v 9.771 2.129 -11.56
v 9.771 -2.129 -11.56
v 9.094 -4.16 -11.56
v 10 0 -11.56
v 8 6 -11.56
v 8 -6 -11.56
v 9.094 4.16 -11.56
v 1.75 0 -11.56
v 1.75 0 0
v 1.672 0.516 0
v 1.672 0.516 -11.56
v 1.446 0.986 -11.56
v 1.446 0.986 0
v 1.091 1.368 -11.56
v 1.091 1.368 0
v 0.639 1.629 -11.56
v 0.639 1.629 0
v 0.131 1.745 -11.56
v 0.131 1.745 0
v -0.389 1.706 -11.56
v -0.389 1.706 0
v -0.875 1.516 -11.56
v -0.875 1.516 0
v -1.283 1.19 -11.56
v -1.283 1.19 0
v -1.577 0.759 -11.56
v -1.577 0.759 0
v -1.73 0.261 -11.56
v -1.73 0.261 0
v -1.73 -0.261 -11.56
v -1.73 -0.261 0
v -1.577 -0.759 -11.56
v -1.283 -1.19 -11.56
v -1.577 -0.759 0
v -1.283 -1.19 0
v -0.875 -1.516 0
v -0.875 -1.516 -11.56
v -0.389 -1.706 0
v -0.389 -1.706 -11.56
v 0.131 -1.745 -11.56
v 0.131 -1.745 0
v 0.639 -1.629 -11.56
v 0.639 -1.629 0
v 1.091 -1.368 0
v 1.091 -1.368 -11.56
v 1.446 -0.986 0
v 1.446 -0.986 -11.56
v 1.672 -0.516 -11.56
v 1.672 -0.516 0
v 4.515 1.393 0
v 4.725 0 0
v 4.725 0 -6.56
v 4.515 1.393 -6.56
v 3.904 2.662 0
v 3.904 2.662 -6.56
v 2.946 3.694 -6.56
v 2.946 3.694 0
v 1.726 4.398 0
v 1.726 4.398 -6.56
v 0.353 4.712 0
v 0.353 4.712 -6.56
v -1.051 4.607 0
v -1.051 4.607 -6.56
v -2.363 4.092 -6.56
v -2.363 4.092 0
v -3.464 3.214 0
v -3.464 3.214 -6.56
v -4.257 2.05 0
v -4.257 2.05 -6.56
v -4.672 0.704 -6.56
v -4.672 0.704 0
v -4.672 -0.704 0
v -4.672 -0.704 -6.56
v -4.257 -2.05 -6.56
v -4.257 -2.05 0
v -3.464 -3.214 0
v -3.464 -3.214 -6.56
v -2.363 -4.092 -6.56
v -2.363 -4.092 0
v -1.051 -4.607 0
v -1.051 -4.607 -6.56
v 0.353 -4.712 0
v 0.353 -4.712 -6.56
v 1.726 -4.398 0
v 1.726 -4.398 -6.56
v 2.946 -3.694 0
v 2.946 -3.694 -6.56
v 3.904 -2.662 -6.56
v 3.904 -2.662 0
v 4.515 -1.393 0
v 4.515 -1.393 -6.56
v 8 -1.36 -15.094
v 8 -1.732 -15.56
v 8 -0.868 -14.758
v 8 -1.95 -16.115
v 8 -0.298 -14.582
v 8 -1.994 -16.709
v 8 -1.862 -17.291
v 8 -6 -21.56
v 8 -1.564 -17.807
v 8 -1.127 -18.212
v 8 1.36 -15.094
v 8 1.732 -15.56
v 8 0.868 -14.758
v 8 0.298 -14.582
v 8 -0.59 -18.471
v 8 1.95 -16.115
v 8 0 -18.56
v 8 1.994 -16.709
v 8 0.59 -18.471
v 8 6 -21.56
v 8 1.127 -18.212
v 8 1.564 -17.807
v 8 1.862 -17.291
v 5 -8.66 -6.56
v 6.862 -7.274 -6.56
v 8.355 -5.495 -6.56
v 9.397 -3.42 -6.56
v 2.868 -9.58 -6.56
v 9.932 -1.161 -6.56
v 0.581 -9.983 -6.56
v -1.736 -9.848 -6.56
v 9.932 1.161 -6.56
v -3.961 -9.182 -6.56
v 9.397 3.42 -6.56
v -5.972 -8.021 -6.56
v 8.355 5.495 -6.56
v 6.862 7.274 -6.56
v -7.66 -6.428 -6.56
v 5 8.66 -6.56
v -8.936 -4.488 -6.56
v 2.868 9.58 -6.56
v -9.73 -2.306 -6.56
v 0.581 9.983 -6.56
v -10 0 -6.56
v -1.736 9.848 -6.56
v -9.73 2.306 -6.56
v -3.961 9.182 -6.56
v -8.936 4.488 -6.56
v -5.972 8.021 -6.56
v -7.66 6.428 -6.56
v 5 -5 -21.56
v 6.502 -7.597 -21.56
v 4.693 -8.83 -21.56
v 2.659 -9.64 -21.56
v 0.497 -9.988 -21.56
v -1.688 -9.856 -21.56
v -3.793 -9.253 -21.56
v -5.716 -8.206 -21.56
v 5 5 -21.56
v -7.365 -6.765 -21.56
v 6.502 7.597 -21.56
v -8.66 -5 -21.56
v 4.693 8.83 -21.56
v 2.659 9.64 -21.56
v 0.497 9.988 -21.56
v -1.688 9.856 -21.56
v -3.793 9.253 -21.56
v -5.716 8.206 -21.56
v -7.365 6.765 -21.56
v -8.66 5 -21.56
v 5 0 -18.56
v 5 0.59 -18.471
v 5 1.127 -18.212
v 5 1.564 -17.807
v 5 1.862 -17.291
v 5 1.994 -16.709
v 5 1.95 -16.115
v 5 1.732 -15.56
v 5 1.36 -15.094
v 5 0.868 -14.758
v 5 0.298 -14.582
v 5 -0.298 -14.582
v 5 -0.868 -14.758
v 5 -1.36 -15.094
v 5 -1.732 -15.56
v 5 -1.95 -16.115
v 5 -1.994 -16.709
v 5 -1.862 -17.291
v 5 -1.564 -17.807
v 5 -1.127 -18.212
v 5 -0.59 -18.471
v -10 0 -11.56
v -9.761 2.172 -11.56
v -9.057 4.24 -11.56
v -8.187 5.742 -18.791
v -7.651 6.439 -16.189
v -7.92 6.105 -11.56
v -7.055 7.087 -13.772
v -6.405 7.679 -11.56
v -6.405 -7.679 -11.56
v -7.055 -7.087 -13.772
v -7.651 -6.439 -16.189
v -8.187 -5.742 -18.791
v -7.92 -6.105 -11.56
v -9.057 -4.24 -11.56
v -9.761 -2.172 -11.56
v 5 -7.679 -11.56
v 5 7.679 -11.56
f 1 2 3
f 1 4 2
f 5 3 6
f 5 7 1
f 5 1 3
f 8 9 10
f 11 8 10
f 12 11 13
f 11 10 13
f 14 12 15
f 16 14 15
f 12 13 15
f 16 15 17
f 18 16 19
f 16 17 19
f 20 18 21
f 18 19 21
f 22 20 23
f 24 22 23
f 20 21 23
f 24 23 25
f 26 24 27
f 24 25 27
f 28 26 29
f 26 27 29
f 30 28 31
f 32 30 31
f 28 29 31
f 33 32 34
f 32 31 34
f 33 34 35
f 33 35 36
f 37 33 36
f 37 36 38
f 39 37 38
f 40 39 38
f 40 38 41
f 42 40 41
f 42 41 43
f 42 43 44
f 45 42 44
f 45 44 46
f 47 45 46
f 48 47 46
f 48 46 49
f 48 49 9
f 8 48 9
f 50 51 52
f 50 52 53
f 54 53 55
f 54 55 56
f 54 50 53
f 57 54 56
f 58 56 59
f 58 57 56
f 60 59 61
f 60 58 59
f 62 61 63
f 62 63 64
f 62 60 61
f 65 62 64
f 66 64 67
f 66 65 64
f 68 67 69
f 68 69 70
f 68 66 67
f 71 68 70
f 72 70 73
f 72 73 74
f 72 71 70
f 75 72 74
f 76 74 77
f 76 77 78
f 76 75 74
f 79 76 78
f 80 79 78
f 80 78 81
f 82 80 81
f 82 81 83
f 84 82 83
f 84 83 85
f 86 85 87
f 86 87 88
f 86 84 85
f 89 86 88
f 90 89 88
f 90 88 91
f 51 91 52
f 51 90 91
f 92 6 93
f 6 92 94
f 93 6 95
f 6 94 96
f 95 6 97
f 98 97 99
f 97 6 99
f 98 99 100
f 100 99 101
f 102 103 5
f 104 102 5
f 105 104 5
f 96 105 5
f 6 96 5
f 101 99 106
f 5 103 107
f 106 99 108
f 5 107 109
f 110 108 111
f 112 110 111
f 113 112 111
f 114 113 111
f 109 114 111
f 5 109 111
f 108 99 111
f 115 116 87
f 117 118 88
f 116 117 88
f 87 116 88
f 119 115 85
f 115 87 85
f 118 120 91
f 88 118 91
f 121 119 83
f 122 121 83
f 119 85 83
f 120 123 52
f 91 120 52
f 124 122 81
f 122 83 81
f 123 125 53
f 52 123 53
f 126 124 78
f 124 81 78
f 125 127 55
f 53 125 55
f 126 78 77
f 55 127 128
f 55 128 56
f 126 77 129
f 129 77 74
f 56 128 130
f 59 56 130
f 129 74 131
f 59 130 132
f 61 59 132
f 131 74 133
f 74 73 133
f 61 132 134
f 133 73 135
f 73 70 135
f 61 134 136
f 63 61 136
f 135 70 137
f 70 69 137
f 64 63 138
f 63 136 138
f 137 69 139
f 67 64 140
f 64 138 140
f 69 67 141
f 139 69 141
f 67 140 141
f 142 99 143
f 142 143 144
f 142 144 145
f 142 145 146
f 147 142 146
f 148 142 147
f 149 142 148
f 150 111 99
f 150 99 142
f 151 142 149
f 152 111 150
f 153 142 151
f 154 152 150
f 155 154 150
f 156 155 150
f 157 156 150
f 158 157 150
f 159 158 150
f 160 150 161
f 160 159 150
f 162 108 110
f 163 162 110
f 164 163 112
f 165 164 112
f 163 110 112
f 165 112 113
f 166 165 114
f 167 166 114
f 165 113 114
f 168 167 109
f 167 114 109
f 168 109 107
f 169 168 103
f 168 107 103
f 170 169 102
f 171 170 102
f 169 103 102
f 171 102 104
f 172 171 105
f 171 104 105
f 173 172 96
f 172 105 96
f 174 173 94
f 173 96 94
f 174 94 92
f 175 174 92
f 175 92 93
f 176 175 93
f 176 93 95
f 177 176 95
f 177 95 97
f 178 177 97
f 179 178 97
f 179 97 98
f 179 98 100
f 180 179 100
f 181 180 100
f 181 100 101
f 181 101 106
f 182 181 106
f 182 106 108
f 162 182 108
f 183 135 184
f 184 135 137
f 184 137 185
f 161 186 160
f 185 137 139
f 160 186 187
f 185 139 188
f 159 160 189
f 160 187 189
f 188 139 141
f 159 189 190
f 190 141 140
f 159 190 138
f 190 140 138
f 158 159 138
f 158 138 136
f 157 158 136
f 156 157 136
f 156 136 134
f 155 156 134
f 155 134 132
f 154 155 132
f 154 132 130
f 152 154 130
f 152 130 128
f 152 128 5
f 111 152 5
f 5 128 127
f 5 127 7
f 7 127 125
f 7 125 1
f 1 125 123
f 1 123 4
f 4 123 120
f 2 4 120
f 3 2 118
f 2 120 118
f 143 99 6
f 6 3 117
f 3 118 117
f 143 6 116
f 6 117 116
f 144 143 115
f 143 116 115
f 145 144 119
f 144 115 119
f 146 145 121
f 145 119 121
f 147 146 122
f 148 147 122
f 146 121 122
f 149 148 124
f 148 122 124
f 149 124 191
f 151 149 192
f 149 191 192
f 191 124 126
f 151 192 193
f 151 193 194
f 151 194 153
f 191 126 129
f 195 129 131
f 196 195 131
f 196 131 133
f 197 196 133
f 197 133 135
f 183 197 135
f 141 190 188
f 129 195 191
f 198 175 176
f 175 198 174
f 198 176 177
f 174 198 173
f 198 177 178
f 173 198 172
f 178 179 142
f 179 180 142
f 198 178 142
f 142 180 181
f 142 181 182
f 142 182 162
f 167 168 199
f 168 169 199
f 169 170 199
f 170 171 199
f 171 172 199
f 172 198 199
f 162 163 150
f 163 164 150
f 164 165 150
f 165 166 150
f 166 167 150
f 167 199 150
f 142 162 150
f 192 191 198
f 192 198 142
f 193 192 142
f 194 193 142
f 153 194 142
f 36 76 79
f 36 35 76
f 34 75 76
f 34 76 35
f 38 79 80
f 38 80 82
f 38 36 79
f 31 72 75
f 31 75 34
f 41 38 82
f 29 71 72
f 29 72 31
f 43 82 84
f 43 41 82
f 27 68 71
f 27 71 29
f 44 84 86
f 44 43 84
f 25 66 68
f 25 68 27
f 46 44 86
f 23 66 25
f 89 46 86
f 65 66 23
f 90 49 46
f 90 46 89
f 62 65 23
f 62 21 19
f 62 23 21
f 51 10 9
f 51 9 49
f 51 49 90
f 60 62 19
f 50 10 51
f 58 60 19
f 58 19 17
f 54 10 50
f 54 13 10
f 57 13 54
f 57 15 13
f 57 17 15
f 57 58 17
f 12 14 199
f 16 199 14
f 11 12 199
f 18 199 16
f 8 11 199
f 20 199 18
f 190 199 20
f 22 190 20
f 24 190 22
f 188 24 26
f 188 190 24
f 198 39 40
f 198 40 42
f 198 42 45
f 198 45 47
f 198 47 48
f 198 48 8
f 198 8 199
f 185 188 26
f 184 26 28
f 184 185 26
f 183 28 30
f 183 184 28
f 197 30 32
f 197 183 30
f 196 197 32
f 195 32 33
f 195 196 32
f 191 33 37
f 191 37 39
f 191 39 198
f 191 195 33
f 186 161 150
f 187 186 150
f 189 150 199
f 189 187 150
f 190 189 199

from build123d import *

# Parameters (mm, degrees)
SKETCH1_R               = 4.725
BOSS_EXTRUDE1_DEPTH     = 6.56
SKETCH5_R               = 10
BOSS_EXTRUDE3_DEPTH     = 15
CUT_EXTRUDE1_DEPTH      = 5
CUT_EXTRUDE1_DEPTH_BACK = 15
SKETCH4_W               = 2
SKETCH4_H               = 12
CUT_EXTRUDE2_DEPTH      = 10
CUT_EXTRUDE3_REACH      = 31.813
SKETCH6_R               = 2
SKETCH7_R               = 1.75
CUT_EXTRUDE4_DEPTH      = 26.784367357


with BuildPart() as part:
    # Sketch1 → Boss-Extrude1 (new body)
    with BuildSketch(Plane.XY):
        Circle(SKETCH1_R)
    extrude(amount=-BOSS_EXTRUDE1_DEPTH)

    # Sketch5 → Boss-Extrude3 (add)
    with BuildSketch(Plane(origin=(0, 0, -6.56), x_dir=(-1, 0, 0), z_dir=(0, 0, -1))):
        Circle(SKETCH5_R)
    extrude(amount=BOSS_EXTRUDE3_DEPTH)

    # Sketch3 → Cut-Extrude1 (cut, two sides: drawn at the far end of the back side and taken through both)
    with BuildSketch(Plane(origin=(0, 0, 0), x_dir=(0, 0, -1), z_dir=(1, 0, 0)).offset(-CUT_EXTRUDE1_DEPTH_BACK)):
        Polygon((21.56, -5), (21.56, 5), (11.56, 7.679491924), (11.56, -7.679491924), align=None)
    extrude(amount=CUT_EXTRUDE1_DEPTH + CUT_EXTRUDE1_DEPTH_BACK, mode=Mode.SUBTRACT)

    # Sketch4 → Cut-Extrude2 (cut)
    with BuildSketch(Plane(origin=(0, 0, -21.56), x_dir=(-1, 0, 0), z_dir=(0, 0, -1))):
        with Locations((-9, 0)):
            Rectangle(SKETCH4_W, SKETCH4_H)
    extrude(amount=-CUT_EXTRUDE2_DEPTH, mode=Mode.SUBTRACT)

    # Sketch6 → Cut-Extrude3 (cut, up to next)
    with BuildSketch(Plane(origin=(8, 0, 0), x_dir=(0, 0, -1), z_dir=(1, 0, 0)), mode=Mode.PRIVATE) as cut_extrude3_sk1:
        with Locations((16.56, 0)):
            Circle(SKETCH6_R)
    cut_extrude3_tool1 = extrude(cut_extrude3_sk1.sketch, amount=-CUT_EXTRUDE3_REACH, mode=Mode.PRIVATE) & part.part
    add(cut_extrude3_tool1.solids().sort_by_distance((8, 0, -16.56))[0], mode=Mode.SUBTRACT)

    # Sketch7 → Cut-Extrude4 (cut, through all)
    with BuildSketch(Plane.XY):
        Circle(SKETCH7_R)
    extrude(amount=-CUT_EXTRUDE4_DEPTH, mode=Mode.SUBTRACT)


solid = part.part
